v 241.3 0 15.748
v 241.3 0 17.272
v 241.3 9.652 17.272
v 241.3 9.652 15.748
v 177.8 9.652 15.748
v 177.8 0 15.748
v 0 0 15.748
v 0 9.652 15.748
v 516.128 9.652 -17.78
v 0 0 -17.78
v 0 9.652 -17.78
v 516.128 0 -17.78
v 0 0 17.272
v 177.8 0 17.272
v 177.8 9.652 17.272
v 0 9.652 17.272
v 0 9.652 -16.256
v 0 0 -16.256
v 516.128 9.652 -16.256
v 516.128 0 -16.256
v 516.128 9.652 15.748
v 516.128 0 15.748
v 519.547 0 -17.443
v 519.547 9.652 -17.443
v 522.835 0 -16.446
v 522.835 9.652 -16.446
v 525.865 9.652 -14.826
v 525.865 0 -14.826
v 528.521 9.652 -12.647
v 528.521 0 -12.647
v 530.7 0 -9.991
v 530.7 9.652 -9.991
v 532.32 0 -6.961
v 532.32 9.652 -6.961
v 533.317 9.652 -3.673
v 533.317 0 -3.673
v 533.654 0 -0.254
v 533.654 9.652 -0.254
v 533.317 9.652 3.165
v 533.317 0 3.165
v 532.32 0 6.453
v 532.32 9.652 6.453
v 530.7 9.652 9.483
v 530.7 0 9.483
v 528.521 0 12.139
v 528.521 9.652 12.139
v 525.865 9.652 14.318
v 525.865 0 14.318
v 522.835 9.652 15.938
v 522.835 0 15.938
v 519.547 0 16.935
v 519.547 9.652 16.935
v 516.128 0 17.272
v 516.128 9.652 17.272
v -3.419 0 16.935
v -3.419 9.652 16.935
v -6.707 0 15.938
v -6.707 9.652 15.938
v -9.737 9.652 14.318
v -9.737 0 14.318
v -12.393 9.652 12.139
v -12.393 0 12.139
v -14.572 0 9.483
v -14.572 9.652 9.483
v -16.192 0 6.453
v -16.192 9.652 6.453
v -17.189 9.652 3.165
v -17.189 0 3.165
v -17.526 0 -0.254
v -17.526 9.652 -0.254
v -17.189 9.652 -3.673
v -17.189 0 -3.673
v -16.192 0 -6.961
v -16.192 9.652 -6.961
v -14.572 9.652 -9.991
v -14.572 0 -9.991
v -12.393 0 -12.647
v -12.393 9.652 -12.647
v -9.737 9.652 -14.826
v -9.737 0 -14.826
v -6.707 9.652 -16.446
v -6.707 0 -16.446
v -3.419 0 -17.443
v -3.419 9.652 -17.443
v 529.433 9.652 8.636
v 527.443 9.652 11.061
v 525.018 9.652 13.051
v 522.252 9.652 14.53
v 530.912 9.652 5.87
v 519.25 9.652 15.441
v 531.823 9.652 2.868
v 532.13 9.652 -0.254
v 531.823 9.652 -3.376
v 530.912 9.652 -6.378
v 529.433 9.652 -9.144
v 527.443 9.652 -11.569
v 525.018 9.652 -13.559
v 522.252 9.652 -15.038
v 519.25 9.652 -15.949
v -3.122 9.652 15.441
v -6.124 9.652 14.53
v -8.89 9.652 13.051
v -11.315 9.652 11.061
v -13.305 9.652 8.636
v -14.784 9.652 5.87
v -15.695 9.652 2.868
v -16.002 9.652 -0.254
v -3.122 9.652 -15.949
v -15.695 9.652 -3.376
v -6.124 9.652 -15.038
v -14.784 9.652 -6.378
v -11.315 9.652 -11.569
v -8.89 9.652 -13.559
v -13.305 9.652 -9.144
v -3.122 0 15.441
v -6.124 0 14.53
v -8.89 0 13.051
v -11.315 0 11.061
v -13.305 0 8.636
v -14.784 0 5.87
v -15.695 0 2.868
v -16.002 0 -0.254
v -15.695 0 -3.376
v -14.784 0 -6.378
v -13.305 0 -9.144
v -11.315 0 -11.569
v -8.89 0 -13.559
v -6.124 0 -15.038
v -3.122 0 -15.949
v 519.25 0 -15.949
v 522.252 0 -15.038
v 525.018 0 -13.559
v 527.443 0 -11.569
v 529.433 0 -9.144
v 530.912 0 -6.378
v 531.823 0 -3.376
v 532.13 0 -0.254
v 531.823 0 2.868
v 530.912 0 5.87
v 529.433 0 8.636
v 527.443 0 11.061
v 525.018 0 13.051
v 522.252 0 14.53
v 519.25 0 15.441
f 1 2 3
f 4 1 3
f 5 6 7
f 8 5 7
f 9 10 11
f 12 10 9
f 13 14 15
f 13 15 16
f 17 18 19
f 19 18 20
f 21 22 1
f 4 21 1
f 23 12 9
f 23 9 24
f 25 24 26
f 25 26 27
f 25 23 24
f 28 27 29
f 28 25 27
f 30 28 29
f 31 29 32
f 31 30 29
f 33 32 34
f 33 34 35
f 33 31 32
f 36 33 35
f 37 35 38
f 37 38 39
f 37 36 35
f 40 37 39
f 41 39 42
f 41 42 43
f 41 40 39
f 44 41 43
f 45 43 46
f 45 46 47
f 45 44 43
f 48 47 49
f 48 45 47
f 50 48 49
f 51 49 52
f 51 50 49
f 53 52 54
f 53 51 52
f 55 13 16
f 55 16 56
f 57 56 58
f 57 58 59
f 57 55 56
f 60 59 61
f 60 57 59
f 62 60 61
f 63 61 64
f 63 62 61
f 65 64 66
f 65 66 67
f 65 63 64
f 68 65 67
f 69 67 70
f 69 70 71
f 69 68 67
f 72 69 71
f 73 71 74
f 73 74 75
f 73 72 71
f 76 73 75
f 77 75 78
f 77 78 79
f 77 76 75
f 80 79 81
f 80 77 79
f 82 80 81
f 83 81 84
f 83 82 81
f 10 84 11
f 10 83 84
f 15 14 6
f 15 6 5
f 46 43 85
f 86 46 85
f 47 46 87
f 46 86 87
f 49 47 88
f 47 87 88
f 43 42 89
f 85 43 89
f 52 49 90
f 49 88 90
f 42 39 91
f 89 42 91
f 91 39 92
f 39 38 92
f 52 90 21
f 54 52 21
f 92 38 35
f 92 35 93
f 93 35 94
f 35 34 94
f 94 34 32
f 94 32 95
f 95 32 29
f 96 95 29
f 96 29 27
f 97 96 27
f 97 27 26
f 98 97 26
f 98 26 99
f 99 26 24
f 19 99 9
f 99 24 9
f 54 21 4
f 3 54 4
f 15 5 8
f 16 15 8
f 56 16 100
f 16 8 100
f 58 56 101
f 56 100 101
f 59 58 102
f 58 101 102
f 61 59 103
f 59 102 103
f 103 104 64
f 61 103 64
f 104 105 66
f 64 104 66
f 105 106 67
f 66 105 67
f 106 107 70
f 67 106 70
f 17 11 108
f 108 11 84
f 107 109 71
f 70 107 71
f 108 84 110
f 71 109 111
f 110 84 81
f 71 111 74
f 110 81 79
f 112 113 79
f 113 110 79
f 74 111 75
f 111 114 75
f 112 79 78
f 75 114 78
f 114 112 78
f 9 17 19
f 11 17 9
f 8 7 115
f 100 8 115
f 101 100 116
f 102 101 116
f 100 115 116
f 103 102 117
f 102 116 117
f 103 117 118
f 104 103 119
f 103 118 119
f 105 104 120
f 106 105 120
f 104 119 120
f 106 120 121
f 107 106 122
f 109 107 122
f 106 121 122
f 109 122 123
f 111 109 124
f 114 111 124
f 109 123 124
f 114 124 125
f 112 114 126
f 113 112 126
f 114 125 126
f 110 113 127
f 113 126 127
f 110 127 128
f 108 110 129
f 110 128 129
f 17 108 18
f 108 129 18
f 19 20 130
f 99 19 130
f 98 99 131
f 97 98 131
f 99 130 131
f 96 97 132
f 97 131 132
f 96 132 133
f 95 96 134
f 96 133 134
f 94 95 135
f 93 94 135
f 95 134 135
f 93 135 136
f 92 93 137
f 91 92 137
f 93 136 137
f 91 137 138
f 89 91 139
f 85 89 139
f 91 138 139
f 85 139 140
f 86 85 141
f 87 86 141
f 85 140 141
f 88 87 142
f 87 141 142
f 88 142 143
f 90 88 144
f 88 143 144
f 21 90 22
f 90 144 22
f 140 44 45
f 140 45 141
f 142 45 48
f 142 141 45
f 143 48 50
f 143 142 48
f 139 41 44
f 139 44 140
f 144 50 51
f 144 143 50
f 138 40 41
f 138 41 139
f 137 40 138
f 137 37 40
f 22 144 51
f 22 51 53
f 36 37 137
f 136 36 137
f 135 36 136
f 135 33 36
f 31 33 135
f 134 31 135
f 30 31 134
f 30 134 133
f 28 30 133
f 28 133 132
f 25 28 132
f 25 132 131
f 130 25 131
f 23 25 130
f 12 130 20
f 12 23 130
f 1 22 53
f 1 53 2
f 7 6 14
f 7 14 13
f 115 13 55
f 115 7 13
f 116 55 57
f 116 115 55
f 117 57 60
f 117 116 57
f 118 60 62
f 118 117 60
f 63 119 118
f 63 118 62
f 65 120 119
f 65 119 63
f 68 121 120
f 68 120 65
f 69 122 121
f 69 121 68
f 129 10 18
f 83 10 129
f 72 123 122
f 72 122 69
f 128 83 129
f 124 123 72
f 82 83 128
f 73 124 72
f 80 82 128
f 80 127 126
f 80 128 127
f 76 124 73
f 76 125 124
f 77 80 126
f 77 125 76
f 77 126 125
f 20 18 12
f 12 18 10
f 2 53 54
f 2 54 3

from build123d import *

# Parameters (mm, degrees)
BOSS_EXTRUDE1_DEPTH = 9.652
SKETCH2_W           = 63.5
SKETCH2_H           = 9.652
CUT_EXTRUDE1_DEPTH  = 12.7


with BuildPart() as part:
    # Sketch1 → Boss-Extrude1 (new body)
    with BuildSketch(Plane(origin=(0, 0, 0), x_dir=(1, 0, 0), z_dir=(0, 1, 0))):
        with BuildLine():
            Line((0, 17.78), (516.128, 17.78))
            ThreePointArc((516.128, 17.78), (533.654, 0.254), (516.128, -17.272))
            Line((516.128, -17.272), (0, -17.272))
            ThreePointArc((0, -17.272), (-17.526, 0.254), (0, 17.78))
        make_face()
        with BuildLine():
            Line((0, 16.256), (516.128, 16.256))
            ThreePointArc((516.128, 16.256), (532.13, 0.254), (516.128, -15.748))
            Line((516.128, -15.748), (0, -15.748))
            ThreePointArc((0, -15.748), (-16.002, 0.254), (0, 16.256))
        make_face(mode=Mode.SUBTRACT)
    extrude(amount=BOSS_EXTRUDE1_DEPTH)

    # Sketch2 → Cut-Extrude1 (cut)
    with BuildSketch(Plane.XY.offset(17.272)):
        with Locations((209.55, 4.826)):
            Rectangle(SKETCH2_W, SKETCH2_H)
    extrude(amount=-CUT_EXTRUDE1_DEPTH, mode=Mode.SUBTRACT)


solid = part.part
